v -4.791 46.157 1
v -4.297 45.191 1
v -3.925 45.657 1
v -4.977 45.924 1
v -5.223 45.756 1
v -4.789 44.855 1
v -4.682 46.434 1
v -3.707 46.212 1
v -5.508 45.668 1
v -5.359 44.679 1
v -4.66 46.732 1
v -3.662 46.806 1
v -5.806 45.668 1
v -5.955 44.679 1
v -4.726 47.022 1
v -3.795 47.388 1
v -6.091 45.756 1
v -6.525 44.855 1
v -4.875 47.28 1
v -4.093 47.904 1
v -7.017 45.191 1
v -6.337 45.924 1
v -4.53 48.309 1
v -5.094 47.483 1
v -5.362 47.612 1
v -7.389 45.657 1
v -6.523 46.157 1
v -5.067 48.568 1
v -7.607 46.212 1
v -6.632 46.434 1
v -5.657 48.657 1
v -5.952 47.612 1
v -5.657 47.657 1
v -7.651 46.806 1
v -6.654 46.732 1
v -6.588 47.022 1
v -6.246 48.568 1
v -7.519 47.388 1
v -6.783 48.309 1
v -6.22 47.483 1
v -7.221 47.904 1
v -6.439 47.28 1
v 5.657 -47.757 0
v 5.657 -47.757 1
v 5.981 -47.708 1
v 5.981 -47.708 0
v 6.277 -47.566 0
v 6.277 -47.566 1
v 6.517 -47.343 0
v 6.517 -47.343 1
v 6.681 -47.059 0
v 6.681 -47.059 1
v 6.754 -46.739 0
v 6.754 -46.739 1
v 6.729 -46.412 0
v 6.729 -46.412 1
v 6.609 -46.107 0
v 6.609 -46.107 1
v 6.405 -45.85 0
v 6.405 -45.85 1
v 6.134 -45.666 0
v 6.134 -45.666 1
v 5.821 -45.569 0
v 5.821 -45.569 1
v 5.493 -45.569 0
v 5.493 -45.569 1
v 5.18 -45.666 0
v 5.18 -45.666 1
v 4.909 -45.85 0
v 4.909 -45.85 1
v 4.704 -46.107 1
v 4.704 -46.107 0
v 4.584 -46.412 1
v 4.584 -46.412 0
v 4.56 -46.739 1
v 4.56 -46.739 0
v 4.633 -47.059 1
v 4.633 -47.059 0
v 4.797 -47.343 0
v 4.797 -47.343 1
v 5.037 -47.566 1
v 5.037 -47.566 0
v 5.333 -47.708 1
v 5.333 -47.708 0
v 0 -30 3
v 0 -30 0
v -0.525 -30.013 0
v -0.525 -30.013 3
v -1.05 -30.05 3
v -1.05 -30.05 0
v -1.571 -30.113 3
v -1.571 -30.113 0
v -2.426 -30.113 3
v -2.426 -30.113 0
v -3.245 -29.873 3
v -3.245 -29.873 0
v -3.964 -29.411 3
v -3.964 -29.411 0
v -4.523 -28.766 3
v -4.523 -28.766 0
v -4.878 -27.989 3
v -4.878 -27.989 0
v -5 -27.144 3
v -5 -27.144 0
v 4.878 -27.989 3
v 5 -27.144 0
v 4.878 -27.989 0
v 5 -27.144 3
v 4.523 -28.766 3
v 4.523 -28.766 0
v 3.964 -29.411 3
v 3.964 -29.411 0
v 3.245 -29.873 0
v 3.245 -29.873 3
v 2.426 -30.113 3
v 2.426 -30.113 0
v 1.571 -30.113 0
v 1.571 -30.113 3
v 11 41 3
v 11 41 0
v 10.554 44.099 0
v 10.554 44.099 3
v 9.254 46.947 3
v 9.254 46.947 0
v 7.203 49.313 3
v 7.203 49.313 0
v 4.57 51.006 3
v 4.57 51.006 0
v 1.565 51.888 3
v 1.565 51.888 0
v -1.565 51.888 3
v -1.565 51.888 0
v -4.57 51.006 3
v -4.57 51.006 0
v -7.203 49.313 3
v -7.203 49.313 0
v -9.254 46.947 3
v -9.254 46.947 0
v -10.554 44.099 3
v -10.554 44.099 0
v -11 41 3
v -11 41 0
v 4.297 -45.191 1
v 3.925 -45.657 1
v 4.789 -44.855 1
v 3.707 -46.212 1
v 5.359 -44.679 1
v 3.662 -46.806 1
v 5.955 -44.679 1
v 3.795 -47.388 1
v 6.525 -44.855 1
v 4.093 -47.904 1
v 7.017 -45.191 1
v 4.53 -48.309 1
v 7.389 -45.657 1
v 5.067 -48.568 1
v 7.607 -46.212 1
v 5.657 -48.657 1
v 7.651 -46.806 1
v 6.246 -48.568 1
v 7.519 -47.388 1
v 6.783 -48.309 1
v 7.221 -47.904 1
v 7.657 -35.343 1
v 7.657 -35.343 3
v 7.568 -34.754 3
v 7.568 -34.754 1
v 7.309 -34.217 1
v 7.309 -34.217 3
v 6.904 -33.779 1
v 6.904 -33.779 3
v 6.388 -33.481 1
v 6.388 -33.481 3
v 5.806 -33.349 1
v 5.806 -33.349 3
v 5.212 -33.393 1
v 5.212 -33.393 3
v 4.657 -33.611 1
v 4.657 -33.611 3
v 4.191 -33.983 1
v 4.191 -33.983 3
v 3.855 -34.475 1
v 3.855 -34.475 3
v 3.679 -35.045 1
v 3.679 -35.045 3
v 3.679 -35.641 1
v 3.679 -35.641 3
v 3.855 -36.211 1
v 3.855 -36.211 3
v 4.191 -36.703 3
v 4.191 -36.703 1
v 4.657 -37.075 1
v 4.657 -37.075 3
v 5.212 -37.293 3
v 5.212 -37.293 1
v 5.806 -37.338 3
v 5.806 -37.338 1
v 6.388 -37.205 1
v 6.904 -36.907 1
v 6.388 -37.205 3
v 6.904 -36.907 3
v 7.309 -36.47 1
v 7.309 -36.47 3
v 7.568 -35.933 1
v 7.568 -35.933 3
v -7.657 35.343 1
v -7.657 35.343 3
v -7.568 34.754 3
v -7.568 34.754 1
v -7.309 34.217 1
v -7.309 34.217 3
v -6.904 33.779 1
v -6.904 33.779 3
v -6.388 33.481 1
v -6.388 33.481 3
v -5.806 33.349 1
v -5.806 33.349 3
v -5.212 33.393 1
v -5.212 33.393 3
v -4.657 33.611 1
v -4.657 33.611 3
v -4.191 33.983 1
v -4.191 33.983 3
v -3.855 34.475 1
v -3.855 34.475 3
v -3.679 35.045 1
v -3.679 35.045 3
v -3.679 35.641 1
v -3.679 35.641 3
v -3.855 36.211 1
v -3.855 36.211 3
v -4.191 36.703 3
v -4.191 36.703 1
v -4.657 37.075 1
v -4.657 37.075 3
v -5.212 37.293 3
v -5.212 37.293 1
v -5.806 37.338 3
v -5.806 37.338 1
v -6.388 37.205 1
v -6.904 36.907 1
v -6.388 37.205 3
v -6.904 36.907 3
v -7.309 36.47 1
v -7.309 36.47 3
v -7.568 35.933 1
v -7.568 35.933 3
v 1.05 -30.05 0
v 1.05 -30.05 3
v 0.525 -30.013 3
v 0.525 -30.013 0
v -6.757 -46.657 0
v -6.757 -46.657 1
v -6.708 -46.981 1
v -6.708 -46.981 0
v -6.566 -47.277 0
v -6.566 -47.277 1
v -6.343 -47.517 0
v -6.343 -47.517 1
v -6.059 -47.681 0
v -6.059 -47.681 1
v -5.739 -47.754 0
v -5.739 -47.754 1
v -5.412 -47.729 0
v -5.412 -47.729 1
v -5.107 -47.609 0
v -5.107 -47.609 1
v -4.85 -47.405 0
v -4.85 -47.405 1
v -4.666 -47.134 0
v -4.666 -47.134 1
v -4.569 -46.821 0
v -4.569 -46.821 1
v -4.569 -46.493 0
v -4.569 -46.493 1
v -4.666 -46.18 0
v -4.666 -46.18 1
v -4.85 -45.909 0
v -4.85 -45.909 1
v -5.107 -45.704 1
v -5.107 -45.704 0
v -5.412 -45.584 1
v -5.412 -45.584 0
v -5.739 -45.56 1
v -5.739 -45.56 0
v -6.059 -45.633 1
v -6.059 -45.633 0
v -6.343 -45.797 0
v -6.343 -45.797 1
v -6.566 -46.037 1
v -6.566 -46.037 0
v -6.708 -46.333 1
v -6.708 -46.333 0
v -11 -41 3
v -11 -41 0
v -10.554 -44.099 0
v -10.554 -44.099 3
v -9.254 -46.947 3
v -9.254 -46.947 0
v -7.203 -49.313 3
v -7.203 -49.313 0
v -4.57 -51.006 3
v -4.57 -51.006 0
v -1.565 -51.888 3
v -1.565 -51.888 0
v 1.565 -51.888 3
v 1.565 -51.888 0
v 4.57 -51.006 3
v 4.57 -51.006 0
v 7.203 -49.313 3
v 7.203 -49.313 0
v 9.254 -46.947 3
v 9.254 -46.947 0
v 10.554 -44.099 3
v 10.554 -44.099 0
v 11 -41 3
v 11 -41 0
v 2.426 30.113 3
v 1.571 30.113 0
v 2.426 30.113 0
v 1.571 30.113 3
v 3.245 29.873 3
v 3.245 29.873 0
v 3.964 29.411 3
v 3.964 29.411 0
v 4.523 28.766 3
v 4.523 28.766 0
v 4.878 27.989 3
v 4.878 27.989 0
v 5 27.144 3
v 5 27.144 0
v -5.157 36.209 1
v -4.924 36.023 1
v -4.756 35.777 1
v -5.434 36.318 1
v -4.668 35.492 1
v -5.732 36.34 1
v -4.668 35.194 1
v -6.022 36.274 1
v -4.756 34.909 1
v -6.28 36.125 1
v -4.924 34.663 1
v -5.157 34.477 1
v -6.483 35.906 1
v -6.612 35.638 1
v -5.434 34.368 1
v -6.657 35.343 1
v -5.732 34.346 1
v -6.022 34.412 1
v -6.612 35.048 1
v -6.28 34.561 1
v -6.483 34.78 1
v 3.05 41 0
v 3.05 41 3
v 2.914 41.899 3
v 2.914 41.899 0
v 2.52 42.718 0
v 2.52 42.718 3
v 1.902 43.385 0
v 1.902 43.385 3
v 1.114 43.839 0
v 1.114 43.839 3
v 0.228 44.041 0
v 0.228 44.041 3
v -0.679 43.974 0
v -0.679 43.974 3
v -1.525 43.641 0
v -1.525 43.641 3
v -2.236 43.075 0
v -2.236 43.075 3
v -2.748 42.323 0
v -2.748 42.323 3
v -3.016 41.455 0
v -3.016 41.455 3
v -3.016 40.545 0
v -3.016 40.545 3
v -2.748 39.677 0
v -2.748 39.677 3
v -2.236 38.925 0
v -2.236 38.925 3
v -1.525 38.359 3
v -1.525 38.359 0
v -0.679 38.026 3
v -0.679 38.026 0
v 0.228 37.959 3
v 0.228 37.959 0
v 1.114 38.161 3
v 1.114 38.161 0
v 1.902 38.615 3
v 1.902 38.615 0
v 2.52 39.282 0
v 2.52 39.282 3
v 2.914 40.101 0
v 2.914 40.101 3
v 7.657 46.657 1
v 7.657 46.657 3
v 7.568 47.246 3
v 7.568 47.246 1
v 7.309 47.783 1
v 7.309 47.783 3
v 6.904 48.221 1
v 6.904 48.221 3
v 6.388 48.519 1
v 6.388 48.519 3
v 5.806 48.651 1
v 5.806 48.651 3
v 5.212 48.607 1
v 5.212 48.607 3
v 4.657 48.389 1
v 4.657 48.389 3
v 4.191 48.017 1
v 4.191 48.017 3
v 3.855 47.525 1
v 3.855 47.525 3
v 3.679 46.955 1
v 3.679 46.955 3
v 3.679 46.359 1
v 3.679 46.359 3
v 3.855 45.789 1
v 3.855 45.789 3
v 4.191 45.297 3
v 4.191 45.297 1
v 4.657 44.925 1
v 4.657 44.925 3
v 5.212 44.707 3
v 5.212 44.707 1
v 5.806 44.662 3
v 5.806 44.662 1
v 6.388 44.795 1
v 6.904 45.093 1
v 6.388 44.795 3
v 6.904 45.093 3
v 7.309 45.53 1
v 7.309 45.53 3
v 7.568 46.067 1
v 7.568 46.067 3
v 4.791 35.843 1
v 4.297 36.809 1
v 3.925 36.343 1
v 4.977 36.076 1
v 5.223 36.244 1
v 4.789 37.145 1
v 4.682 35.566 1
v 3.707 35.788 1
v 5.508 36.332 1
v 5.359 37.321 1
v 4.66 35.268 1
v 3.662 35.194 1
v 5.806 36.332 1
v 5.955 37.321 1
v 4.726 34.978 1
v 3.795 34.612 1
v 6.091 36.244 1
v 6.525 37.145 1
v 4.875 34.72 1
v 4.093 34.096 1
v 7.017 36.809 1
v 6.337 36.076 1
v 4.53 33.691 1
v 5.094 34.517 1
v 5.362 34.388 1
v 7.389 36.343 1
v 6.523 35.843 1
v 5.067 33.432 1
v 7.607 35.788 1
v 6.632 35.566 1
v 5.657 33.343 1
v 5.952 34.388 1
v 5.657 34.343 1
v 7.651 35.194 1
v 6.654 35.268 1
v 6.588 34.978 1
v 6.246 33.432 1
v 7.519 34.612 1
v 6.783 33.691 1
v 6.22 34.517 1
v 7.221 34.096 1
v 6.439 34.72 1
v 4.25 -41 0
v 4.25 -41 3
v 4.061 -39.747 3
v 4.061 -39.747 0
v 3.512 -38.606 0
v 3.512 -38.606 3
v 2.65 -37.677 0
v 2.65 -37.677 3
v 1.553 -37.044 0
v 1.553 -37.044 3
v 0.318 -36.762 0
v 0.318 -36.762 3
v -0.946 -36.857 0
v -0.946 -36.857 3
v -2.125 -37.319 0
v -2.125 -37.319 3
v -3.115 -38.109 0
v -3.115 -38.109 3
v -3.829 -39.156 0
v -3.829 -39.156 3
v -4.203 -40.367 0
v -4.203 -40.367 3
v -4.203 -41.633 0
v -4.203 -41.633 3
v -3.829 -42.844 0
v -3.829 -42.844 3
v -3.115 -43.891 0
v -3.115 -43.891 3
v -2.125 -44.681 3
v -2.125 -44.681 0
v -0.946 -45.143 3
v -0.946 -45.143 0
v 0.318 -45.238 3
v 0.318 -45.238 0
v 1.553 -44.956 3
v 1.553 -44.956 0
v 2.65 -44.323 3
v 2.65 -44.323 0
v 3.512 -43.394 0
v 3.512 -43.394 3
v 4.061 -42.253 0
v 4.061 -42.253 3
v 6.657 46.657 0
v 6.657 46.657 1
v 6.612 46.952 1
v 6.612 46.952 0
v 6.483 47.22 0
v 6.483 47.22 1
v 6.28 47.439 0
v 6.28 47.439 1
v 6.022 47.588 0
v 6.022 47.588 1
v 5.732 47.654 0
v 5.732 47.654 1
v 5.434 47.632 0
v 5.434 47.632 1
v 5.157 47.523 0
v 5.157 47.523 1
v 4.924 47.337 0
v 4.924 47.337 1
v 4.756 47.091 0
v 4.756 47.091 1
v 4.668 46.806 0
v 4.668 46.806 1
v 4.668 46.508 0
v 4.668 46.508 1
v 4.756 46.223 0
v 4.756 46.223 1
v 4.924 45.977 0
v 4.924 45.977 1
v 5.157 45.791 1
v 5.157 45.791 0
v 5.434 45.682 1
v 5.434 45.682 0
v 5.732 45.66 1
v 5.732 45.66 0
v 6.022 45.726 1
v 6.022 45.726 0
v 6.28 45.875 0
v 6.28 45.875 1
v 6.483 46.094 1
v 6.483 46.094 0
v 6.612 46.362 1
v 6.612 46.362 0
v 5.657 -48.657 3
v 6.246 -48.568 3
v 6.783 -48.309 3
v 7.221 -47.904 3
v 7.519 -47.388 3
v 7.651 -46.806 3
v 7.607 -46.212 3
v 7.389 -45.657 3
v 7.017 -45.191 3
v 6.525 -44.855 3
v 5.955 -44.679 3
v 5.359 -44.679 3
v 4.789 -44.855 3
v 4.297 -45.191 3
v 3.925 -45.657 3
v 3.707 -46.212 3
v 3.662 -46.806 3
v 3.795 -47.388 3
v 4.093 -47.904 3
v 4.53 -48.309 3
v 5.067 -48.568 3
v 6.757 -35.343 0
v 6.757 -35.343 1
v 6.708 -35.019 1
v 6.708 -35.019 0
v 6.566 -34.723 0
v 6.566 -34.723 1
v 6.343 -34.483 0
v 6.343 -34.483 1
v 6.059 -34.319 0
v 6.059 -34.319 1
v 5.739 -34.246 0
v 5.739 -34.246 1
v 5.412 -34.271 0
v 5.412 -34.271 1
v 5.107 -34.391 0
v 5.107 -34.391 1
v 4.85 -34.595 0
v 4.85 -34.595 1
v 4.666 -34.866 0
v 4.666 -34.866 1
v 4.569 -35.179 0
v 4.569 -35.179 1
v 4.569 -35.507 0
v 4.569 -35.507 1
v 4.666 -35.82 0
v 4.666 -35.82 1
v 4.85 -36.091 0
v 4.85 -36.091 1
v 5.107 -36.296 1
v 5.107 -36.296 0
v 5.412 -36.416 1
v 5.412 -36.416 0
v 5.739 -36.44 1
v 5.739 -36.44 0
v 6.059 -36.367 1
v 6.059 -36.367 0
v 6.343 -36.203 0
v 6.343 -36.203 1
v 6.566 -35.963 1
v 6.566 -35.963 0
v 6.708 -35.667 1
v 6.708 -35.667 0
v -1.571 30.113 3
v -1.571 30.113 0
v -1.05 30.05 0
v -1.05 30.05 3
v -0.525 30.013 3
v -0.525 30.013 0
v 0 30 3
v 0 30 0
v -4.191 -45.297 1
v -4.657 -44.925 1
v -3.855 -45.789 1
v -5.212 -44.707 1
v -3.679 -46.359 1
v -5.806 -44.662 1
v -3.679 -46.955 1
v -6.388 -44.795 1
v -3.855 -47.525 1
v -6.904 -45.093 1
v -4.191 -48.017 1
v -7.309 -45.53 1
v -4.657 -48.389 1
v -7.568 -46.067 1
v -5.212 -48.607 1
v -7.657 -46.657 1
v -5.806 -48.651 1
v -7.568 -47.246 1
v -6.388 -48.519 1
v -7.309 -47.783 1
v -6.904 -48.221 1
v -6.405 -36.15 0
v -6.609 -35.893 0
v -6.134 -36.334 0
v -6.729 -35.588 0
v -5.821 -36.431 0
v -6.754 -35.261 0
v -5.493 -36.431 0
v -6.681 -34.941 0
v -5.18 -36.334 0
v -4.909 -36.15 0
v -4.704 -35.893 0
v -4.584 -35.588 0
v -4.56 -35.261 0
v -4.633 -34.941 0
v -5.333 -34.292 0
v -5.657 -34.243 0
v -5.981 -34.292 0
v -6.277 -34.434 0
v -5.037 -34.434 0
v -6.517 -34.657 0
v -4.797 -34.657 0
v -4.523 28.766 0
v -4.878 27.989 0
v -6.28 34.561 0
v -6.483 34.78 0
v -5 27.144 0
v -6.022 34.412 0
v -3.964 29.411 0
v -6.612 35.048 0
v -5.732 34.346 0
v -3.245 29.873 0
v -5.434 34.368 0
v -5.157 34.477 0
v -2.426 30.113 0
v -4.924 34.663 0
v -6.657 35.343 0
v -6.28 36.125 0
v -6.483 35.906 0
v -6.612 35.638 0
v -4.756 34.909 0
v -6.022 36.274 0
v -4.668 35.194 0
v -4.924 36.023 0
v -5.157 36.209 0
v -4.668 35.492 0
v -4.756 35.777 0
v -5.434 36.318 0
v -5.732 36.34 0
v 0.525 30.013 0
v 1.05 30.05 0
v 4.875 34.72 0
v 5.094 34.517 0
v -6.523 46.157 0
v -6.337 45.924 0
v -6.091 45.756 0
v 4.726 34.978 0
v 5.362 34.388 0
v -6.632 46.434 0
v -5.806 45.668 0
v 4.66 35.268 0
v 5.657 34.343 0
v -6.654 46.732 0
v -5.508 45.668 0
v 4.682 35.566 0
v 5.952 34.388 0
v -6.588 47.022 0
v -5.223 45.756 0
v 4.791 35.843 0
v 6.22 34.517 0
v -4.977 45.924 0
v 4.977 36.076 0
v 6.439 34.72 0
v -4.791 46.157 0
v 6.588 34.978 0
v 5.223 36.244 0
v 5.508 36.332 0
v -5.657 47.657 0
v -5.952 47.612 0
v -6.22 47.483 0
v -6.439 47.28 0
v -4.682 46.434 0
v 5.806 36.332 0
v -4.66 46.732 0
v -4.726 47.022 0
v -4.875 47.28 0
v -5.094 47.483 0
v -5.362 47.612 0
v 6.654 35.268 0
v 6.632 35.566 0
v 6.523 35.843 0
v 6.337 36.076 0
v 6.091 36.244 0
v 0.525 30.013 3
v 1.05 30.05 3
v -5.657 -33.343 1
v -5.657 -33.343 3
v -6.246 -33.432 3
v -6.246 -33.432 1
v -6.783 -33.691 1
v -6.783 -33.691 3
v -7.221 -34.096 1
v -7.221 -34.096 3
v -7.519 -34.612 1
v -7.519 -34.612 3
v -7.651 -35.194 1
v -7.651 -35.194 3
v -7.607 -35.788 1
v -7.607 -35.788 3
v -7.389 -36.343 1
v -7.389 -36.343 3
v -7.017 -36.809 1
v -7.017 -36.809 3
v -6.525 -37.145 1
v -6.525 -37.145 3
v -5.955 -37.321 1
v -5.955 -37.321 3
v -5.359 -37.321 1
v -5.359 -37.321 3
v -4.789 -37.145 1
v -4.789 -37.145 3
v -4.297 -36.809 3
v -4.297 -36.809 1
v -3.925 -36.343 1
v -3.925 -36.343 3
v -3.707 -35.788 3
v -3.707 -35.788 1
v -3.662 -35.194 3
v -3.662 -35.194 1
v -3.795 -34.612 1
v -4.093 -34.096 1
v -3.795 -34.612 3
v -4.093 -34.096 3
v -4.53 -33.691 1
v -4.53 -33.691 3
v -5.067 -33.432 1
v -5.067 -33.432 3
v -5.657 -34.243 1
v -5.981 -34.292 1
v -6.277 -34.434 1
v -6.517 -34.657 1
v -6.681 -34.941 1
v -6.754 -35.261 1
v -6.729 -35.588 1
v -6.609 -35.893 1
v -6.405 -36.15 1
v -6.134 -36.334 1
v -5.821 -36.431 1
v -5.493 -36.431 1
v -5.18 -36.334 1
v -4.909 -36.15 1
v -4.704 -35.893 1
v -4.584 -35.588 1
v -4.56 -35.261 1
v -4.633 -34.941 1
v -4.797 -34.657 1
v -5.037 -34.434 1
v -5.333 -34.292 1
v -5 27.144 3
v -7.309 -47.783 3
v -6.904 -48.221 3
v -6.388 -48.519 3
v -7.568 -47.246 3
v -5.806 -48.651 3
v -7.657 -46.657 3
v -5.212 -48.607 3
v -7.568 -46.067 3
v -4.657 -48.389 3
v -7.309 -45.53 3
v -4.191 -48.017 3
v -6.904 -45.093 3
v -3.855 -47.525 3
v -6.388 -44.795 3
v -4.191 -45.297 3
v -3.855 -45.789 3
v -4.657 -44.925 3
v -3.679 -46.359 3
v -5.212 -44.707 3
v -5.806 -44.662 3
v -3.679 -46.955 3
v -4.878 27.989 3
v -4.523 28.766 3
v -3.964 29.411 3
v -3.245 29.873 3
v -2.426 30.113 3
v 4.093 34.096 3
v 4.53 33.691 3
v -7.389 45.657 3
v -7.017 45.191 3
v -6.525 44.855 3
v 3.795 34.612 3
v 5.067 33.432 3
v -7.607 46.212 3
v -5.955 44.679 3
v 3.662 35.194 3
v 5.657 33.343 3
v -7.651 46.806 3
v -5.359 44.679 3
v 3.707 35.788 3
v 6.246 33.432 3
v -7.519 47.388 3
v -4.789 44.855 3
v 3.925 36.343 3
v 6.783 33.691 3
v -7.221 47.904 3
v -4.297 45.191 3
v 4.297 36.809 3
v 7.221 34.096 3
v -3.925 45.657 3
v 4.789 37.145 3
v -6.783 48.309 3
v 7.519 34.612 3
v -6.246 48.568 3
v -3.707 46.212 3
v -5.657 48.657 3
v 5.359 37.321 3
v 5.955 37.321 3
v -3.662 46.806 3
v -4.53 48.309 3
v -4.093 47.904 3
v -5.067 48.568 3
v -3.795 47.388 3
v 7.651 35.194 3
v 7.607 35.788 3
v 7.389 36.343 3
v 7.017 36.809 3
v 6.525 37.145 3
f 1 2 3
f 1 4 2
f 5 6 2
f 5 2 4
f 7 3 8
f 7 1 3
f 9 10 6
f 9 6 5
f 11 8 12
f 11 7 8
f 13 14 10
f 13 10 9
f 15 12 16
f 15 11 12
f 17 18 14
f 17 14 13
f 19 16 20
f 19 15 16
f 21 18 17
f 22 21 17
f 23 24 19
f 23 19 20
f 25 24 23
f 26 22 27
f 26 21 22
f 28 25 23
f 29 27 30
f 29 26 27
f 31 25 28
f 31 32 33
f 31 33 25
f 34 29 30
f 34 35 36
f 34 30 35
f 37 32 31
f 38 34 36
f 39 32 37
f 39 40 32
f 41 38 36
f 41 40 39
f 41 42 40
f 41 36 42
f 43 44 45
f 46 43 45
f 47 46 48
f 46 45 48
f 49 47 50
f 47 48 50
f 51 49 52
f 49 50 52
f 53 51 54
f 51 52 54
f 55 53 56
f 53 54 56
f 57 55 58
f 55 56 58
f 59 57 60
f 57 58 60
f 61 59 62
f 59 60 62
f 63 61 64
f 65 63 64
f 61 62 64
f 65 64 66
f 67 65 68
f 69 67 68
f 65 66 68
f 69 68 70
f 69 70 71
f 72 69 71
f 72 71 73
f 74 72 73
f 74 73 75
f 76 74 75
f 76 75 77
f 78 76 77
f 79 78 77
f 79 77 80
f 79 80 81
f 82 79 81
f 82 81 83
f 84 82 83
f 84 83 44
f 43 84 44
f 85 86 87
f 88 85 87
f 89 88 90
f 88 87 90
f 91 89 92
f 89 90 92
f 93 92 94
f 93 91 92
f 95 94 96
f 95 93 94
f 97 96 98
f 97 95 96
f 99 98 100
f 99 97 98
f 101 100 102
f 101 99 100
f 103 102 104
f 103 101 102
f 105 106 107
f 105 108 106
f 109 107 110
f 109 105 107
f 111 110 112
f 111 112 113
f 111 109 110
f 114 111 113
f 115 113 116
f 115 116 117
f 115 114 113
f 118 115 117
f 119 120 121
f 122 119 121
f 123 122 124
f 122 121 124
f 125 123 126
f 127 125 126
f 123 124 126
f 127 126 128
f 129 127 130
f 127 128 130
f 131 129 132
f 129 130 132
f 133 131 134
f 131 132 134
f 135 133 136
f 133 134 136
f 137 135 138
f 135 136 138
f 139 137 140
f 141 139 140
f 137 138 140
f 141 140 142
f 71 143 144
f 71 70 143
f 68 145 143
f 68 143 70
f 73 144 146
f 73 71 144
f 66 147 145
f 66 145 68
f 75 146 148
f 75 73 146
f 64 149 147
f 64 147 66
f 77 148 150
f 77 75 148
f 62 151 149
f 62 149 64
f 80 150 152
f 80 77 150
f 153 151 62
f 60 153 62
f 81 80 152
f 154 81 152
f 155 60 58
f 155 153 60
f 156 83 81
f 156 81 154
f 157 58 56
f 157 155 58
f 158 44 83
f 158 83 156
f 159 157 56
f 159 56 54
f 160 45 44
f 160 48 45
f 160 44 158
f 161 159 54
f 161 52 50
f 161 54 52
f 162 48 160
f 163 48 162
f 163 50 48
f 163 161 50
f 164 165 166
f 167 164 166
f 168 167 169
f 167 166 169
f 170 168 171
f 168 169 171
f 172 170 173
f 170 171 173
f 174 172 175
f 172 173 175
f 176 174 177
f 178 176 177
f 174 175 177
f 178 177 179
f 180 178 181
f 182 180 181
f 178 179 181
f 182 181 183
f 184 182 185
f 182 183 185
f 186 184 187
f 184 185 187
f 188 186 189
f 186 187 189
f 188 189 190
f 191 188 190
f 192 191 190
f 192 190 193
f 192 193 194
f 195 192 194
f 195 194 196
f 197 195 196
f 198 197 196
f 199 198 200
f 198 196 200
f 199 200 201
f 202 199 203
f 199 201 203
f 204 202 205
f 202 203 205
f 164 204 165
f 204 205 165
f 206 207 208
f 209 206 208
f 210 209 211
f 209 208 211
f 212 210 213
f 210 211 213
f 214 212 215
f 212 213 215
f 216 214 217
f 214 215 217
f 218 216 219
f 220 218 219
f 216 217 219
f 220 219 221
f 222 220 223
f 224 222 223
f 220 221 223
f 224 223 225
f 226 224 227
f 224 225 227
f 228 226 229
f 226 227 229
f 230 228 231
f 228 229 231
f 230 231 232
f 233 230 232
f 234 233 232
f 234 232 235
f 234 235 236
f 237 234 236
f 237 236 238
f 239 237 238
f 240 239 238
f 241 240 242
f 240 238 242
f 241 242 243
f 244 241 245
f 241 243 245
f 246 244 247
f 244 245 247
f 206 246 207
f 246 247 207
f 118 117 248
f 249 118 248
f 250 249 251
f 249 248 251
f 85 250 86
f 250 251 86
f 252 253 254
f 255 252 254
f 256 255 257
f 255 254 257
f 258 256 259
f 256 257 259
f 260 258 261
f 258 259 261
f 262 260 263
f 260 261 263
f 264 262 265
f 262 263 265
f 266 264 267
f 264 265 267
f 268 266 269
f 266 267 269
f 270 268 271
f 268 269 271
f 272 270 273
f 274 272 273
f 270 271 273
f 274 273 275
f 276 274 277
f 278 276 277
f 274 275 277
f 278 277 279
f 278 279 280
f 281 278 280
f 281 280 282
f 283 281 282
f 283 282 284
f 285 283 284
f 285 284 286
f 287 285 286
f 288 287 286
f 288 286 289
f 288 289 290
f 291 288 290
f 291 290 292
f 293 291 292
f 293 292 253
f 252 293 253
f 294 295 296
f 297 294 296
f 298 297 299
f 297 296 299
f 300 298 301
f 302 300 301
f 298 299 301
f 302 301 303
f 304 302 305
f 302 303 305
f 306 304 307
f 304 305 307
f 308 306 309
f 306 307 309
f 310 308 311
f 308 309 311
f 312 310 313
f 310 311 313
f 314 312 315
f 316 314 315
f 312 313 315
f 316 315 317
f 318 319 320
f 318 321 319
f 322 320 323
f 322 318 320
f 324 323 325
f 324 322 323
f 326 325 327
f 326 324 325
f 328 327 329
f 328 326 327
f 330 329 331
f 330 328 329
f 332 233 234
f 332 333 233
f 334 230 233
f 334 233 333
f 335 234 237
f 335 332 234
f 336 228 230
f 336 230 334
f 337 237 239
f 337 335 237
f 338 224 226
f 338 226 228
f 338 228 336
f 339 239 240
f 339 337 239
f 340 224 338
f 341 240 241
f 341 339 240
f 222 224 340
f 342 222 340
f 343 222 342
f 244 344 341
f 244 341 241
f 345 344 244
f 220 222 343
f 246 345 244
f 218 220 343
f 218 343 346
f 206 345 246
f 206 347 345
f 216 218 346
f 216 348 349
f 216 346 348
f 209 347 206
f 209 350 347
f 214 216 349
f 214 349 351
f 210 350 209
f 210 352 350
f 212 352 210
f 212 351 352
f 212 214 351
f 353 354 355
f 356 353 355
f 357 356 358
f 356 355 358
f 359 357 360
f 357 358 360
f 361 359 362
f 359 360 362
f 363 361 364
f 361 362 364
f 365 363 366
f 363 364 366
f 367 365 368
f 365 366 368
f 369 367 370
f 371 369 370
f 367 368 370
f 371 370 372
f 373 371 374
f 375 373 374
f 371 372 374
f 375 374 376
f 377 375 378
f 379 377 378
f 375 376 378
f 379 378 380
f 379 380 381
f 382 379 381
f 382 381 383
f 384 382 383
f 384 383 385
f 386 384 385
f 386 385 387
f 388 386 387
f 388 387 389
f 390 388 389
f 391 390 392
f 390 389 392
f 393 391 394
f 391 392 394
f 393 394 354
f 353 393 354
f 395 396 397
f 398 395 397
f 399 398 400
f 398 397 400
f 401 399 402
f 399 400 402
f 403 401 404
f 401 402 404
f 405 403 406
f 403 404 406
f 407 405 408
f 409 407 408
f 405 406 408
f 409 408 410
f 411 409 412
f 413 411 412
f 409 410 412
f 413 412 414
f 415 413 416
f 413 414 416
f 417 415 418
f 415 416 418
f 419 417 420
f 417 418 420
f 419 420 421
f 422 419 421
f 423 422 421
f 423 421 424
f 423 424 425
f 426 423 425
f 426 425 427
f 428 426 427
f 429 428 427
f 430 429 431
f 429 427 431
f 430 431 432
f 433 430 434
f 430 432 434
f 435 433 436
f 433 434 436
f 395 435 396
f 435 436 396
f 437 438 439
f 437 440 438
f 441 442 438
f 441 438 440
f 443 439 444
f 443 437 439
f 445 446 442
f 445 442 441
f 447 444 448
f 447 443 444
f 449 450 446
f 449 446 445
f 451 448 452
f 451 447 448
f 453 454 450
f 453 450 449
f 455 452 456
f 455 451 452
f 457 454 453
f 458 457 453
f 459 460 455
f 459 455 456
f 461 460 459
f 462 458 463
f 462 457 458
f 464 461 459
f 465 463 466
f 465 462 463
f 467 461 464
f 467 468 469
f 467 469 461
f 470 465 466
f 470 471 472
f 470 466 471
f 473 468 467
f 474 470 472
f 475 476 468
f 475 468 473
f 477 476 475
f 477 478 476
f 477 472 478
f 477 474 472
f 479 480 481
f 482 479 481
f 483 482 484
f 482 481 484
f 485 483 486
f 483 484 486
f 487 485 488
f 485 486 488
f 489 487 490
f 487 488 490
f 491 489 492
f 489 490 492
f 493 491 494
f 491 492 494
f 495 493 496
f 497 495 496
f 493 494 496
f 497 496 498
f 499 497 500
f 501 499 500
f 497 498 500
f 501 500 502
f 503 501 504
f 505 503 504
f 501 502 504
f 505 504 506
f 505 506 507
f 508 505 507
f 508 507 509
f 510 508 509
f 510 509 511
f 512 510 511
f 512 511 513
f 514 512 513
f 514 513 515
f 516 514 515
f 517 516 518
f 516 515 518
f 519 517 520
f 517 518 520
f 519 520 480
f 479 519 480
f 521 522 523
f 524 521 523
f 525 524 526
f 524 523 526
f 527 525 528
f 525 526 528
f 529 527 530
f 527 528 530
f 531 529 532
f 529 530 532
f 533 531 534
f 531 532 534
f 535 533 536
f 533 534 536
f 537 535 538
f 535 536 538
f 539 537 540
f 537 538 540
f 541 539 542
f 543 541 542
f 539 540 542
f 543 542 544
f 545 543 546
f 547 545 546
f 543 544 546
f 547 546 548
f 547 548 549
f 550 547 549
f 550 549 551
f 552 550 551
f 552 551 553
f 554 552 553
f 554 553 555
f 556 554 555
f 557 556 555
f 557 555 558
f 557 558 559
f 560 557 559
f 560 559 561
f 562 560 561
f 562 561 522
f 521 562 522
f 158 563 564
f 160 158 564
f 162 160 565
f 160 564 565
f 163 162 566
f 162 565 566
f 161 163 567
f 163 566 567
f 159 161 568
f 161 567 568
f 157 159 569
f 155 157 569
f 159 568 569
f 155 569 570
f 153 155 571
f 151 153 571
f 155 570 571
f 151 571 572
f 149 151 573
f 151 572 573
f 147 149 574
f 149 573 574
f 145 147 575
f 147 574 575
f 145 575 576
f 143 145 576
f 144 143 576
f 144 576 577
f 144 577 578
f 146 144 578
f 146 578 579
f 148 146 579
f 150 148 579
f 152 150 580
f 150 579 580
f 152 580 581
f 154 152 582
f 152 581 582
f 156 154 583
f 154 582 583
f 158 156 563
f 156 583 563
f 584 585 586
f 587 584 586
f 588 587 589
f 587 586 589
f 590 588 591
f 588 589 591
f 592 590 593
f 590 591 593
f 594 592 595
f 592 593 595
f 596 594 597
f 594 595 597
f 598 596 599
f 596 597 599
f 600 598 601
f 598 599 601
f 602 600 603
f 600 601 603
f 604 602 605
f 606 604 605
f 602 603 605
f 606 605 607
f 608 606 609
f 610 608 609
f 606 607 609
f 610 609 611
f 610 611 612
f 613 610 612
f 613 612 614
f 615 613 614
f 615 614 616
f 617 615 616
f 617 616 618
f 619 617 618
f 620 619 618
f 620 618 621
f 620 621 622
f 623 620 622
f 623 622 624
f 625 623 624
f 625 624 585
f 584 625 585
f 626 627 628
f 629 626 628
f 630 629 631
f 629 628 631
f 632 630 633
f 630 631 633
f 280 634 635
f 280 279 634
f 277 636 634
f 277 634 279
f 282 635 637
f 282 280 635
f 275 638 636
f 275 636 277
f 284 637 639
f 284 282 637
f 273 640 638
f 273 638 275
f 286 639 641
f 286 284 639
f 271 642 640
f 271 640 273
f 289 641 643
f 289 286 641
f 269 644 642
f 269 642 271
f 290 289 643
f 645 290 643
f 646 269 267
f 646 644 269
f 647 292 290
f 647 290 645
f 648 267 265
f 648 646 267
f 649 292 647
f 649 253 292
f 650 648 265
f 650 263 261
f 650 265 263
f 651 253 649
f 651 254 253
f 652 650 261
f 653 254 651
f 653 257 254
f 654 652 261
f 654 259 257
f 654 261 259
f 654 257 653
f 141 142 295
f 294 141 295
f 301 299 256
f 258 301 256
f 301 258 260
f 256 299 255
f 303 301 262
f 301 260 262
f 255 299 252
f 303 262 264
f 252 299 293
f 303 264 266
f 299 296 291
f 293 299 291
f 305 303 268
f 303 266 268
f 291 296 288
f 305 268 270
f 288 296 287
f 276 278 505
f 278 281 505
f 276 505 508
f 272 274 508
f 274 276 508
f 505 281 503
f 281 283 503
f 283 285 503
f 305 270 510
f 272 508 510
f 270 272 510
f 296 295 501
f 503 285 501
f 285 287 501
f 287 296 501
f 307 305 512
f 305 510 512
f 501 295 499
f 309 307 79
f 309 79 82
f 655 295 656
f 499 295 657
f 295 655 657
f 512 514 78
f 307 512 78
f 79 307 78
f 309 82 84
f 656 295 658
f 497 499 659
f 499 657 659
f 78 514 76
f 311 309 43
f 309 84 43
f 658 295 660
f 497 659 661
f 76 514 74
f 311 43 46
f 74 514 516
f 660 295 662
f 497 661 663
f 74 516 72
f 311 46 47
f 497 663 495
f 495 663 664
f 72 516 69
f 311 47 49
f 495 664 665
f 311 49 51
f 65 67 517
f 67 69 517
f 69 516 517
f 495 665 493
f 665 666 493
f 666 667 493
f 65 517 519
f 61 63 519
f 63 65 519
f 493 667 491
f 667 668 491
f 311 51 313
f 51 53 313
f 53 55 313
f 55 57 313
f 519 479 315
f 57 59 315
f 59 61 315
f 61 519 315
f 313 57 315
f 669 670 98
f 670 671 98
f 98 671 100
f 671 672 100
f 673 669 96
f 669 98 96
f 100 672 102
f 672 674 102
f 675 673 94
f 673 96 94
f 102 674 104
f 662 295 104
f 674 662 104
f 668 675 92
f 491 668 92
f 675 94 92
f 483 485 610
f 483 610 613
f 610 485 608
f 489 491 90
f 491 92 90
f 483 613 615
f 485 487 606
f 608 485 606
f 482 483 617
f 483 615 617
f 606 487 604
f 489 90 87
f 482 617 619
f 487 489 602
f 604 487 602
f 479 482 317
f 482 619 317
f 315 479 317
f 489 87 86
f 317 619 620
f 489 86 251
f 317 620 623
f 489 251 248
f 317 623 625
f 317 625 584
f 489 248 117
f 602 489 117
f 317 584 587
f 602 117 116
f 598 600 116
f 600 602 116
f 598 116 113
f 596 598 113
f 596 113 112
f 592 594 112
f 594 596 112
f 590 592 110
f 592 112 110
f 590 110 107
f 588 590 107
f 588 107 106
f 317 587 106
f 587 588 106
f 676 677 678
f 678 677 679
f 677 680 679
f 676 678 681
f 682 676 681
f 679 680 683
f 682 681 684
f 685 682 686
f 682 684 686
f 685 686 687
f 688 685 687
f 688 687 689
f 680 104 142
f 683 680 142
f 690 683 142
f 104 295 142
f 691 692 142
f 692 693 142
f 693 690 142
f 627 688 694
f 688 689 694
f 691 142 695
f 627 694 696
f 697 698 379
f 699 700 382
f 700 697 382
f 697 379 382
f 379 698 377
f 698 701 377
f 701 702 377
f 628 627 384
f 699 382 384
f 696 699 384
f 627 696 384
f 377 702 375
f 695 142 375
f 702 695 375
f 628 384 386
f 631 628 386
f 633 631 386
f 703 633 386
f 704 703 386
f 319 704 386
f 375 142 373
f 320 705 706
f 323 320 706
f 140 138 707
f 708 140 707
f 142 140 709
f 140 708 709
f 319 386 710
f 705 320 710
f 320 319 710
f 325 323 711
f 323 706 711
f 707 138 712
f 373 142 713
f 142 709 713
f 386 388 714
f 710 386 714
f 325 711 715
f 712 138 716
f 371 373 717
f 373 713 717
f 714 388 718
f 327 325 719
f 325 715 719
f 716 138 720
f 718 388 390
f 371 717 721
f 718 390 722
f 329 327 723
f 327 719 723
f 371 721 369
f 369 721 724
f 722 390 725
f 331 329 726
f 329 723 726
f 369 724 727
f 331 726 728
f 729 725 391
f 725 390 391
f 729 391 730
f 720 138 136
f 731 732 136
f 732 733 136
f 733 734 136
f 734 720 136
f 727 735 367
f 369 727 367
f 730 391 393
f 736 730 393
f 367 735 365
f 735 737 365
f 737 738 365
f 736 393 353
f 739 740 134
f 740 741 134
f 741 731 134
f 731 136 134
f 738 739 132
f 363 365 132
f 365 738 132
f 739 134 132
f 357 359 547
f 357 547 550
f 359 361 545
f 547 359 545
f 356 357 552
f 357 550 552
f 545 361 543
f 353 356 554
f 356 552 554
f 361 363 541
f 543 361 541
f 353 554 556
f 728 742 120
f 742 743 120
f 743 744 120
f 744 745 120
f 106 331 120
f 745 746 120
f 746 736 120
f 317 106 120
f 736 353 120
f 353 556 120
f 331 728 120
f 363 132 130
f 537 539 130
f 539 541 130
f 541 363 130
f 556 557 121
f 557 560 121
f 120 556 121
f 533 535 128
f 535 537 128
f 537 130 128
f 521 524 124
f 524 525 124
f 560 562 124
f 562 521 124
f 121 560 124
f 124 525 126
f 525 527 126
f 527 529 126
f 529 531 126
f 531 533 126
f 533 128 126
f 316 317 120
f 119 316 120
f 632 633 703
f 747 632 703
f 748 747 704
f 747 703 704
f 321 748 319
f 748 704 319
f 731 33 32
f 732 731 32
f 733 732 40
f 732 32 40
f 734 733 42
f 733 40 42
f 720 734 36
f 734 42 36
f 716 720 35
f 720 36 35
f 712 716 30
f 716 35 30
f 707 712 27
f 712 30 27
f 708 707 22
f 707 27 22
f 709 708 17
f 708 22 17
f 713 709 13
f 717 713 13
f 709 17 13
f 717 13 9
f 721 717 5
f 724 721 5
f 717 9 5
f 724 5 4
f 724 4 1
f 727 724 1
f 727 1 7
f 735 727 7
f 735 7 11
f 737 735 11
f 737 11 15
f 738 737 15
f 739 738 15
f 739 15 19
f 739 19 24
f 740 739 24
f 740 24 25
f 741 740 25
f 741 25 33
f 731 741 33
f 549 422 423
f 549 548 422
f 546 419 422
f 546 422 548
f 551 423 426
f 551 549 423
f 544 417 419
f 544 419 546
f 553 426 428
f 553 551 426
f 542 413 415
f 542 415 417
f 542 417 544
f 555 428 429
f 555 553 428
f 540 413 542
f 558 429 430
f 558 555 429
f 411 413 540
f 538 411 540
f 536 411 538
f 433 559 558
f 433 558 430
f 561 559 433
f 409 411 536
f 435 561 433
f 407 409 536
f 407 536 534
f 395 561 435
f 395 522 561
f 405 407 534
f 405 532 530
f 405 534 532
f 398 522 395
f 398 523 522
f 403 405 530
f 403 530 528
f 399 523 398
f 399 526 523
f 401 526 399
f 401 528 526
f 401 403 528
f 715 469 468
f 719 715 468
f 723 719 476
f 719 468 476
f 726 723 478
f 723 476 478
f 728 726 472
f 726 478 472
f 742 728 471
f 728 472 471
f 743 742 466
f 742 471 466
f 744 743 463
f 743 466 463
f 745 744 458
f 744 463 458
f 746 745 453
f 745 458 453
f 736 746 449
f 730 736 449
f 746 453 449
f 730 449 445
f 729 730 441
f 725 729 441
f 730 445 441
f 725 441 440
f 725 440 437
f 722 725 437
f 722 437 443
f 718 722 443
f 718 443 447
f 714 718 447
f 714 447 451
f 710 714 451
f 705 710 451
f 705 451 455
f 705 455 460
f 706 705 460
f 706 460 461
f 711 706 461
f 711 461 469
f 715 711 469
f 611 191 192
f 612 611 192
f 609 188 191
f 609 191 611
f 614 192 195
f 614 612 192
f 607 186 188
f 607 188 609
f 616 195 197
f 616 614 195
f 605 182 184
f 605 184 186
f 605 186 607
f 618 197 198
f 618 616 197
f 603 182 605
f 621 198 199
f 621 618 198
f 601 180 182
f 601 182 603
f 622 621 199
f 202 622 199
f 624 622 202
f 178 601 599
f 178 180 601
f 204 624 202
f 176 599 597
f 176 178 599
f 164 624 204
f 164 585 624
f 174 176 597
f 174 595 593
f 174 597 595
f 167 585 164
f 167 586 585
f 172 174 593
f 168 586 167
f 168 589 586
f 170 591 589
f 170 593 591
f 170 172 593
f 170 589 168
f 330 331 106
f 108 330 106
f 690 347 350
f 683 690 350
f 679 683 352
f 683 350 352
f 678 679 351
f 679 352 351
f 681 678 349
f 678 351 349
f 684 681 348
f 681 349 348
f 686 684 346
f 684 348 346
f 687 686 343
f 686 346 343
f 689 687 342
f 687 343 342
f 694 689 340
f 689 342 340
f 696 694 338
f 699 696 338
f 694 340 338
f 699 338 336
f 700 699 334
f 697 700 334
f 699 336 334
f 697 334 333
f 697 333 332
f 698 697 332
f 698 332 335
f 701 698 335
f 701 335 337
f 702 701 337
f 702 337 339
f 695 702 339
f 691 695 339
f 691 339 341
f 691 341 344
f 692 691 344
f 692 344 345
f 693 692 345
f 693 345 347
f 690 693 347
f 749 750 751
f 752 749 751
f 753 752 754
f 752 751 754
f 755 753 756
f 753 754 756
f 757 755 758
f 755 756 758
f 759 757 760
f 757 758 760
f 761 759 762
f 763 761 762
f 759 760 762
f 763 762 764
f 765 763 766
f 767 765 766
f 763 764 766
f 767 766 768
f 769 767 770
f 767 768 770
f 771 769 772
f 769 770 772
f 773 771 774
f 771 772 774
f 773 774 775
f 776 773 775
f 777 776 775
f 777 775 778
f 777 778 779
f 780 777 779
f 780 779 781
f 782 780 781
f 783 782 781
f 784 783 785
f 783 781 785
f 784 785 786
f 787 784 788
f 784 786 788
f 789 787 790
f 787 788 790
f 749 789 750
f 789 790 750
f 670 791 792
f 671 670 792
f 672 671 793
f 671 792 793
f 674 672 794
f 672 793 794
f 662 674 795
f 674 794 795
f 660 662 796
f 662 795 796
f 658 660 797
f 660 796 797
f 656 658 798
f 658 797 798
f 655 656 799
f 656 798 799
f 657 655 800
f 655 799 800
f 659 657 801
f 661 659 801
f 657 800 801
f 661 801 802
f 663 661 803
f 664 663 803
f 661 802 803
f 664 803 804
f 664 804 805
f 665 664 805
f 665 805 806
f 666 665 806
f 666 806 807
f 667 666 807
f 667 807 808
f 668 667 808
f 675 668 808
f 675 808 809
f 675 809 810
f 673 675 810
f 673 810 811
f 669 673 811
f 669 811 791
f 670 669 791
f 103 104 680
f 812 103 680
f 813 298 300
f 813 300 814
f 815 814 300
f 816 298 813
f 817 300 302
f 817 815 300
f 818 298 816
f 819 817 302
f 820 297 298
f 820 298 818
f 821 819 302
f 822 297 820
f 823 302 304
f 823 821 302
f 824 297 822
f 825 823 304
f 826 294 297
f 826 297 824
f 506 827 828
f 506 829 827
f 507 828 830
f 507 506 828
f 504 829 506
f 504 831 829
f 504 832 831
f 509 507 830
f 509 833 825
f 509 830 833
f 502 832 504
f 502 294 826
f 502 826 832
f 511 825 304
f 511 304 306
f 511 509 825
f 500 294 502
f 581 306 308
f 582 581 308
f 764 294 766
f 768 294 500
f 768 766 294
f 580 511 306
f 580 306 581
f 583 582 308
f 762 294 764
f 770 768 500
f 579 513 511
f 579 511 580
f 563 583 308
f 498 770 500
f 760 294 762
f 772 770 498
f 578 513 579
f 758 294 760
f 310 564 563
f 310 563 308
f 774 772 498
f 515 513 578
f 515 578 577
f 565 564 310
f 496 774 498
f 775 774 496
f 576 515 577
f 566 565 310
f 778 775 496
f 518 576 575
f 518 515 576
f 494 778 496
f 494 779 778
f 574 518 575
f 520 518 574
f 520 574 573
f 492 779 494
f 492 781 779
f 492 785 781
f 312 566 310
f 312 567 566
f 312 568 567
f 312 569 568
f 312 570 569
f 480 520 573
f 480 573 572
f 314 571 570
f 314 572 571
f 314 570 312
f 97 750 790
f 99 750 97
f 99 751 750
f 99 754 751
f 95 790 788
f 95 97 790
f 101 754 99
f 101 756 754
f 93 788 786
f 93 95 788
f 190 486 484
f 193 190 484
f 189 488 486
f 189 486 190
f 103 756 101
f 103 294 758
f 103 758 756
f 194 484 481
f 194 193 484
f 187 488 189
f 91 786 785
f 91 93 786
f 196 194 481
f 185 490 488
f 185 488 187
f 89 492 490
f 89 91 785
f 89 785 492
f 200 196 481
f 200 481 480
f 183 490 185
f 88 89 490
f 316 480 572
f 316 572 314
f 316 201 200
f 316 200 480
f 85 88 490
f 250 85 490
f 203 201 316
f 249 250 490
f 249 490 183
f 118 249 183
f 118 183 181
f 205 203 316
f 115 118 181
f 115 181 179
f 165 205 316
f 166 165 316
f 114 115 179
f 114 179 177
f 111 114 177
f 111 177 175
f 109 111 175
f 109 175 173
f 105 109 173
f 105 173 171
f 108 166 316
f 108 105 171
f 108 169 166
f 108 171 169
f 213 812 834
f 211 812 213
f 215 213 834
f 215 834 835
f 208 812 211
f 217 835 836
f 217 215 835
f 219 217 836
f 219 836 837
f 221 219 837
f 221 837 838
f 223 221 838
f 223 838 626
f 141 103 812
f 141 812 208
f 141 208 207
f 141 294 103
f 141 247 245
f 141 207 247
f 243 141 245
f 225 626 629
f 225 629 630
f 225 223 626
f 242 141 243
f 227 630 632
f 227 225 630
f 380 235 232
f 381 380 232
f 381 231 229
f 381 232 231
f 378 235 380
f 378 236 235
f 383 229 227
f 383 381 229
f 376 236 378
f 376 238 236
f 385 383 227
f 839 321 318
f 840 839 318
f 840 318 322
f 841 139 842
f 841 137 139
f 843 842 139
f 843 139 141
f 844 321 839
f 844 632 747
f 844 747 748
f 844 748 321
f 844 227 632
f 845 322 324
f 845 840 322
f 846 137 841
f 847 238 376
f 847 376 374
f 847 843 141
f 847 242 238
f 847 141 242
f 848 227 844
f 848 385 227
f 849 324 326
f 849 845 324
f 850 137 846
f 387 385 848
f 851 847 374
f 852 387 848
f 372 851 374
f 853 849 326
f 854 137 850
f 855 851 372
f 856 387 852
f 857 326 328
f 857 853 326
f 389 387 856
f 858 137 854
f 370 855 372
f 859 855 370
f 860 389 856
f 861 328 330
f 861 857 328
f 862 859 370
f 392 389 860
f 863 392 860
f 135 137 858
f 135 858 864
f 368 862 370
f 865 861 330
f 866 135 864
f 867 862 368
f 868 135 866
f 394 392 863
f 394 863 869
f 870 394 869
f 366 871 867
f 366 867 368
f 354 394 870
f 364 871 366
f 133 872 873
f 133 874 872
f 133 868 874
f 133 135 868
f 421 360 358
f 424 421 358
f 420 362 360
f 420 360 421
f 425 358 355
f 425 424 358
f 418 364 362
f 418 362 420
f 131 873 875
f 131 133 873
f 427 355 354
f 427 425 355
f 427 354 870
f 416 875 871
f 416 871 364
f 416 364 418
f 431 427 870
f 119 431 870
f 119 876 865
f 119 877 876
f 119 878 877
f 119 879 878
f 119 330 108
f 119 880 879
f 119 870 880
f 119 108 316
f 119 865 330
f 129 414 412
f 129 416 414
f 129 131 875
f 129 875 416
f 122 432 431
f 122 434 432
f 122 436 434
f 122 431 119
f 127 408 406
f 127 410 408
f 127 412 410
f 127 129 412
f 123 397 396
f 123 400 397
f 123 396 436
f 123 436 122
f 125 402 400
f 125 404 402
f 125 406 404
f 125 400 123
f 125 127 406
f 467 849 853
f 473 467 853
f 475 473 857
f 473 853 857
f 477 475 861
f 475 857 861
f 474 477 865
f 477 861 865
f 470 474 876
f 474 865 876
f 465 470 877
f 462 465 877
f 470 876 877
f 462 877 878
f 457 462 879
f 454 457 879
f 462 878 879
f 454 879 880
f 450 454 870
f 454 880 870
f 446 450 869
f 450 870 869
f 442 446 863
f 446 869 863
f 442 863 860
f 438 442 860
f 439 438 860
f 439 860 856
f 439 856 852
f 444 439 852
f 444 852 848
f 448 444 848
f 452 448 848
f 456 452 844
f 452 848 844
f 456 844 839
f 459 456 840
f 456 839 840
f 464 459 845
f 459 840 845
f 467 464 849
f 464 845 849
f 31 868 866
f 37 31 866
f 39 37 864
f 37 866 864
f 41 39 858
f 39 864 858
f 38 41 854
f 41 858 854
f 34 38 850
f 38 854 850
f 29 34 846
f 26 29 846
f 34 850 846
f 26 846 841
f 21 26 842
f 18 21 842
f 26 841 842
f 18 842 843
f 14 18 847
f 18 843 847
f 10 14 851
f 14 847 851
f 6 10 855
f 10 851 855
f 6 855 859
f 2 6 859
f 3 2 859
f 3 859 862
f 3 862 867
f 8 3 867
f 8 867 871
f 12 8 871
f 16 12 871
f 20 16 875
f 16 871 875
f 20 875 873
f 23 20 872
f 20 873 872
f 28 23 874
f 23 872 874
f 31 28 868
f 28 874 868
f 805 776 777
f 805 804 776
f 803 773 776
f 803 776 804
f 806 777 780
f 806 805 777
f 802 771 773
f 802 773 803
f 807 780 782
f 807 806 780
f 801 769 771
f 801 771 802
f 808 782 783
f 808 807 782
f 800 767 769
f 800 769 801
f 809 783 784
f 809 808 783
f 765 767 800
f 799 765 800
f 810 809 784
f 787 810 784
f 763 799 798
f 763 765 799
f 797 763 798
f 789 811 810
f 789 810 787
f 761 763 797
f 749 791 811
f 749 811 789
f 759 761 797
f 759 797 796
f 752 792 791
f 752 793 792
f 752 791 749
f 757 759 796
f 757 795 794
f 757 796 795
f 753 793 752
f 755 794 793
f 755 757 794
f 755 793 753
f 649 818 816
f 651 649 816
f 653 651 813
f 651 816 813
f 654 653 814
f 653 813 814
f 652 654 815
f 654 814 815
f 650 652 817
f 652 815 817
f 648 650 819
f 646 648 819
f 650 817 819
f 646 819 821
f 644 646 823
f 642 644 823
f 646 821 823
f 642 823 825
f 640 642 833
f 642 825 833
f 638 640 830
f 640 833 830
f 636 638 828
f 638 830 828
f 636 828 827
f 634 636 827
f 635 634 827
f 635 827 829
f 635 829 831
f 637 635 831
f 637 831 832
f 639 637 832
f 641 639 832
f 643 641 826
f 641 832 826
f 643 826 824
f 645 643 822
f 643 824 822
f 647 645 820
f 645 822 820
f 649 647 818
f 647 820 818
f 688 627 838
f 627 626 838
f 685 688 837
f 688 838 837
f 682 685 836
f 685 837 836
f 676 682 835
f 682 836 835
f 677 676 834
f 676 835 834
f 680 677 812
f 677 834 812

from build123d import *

# Parameters (mm, degrees)
BOSS_EXTRUDE1_DEPTH = 3
SKETCH3_R           = 4.25
SKETCH3_R_2         = 1.1
CUT_EXTRUDE3_DEPTH  = 3
SKETCH3_6_R         = 2
CUT_EXTRUDE4_DEPTH  = 2
CIRPATTERN3_COUNT   = 4
SKETCH2_R           = 3.05
SKETCH2_R_2         = 1
CUT_EXTRUDE5_DEPTH  = 3
SKETCH2_5_R         = 2
CUT_EXTRUDE6_DEPTH  = 2
CIRPATTERN4_COUNT   = 4
FILLET1_R           = 3


with BuildPart() as part:
    # Sketch1 → Boss-Extrude1 (new body)
    with BuildSketch(Plane.XY):
        with BuildLine():
            ThreePointArc((11, 41), (0, 52), (-11, 41))
            Line((-11, 41), (-11, -41))
            ThreePointArc((-11, -41), (0, -52), (11, -41))
            Line((11, -41), (11, 41))
        make_face()
        with BuildLine():
            ThreePointArc((0, 30), (2.571230378, 30.304731217), (5, 31.202041029))
            Line((5, 31.202041029), (5, -31.202041029))
            ThreePointArc((5, -31.202041029), (2.571230378, -30.304731217), (0, -30))
            ThreePointArc((0, -30), (-2.571230378, -30.304731217), (-5, -31.202041029))
            Line((-5, -31.202041029), (-5, 31.202041029))
            ThreePointArc((-5, 31.202041029), (-2.571230378, 30.304731217), (0, 30))
        make_face(mode=Mode.SUBTRACT)
    extrude(amount=BOSS_EXTRUDE1_DEPTH)

    # Sketch3 → Cut-Extrude3 (cut)
    with BuildSketch(Plane.XY.offset(3)):
        with Locations((0, -41)):
            Circle(SKETCH3_R)
        with Locations((5.656854249, -35.343145751)):
            Circle(SKETCH3_R_2)
    cut_extrude3 = extrude(amount=-CUT_EXTRUDE3_DEPTH, mode=Mode.SUBTRACT)

    # Sketch3<6> → Cut-Extrude4 (cut)
    with BuildSketch(Plane.XY.offset(3)):
        with Locations((5.656854249, -35.343145751)):
            Circle(SKETCH3_6_R)
    cut_extrude4 = extrude(amount=-CUT_EXTRUDE4_DEPTH, mode=Mode.SUBTRACT)

    # CirPattern3: Cut-Extrude3, Cut-Extrude4 ×4 about axis
    cirpattern3_axis = Axis((0, -41, 0), (0, 0, 1))
    add([cut_extrude3.rotate(cirpattern3_axis, i * 360 / CIRPATTERN3_COUNT) for i in range(1, CIRPATTERN3_COUNT)], mode=Mode.SUBTRACT)
    add([cut_extrude4.rotate(cirpattern3_axis, i * 360 / CIRPATTERN3_COUNT) for i in range(1, CIRPATTERN3_COUNT)], mode=Mode.SUBTRACT)

    # Sketch2 → Cut-Extrude5 (cut)
    with BuildSketch(Plane.XY.offset(3)):
        with Locations((0, 41)):
            Circle(SKETCH2_R)
        with Locations((5.656854249, 46.656854249)):
            Circle(SKETCH2_R_2)
    cut_extrude5 = extrude(amount=-CUT_EXTRUDE5_DEPTH, mode=Mode.SUBTRACT)

    # Sketch2<5> → Cut-Extrude6 (cut)
    with BuildSketch(Plane.XY.offset(3)):
        with Locations((5.656854249, 46.656854249)):
            Circle(SKETCH2_5_R)
    cut_extrude6 = extrude(amount=-CUT_EXTRUDE6_DEPTH, mode=Mode.SUBTRACT)

    # CirPattern4: Cut-Extrude5, Cut-Extrude6 ×4 about axis
    cirpattern4_axis = Axis((0, 41, 0), (0, 0, 1))
    add([cut_extrude5.rotate(cirpattern4_axis, i * 360 / CIRPATTERN4_COUNT) for i in range(1, CIRPATTERN4_COUNT)], mode=Mode.SUBTRACT)
    add([cut_extrude6.rotate(cirpattern4_axis, i * 360 / CIRPATTERN4_COUNT) for i in range(1, CIRPATTERN4_COUNT)], mode=Mode.SUBTRACT)

    # Fillet1
    fillet1_edges = [part.edges().sort_by_distance(p)[0] for p in [
        (5, 31.202041029, 1.5),
        (-5, 31.202041029, 1.5),
        (-5, -31.202041029, 1.5),
        (5, -31.202041029, 1.5),
    ]]
    fillet(fillet1_edges, radius=FILLET1_R)


solid = part.part
